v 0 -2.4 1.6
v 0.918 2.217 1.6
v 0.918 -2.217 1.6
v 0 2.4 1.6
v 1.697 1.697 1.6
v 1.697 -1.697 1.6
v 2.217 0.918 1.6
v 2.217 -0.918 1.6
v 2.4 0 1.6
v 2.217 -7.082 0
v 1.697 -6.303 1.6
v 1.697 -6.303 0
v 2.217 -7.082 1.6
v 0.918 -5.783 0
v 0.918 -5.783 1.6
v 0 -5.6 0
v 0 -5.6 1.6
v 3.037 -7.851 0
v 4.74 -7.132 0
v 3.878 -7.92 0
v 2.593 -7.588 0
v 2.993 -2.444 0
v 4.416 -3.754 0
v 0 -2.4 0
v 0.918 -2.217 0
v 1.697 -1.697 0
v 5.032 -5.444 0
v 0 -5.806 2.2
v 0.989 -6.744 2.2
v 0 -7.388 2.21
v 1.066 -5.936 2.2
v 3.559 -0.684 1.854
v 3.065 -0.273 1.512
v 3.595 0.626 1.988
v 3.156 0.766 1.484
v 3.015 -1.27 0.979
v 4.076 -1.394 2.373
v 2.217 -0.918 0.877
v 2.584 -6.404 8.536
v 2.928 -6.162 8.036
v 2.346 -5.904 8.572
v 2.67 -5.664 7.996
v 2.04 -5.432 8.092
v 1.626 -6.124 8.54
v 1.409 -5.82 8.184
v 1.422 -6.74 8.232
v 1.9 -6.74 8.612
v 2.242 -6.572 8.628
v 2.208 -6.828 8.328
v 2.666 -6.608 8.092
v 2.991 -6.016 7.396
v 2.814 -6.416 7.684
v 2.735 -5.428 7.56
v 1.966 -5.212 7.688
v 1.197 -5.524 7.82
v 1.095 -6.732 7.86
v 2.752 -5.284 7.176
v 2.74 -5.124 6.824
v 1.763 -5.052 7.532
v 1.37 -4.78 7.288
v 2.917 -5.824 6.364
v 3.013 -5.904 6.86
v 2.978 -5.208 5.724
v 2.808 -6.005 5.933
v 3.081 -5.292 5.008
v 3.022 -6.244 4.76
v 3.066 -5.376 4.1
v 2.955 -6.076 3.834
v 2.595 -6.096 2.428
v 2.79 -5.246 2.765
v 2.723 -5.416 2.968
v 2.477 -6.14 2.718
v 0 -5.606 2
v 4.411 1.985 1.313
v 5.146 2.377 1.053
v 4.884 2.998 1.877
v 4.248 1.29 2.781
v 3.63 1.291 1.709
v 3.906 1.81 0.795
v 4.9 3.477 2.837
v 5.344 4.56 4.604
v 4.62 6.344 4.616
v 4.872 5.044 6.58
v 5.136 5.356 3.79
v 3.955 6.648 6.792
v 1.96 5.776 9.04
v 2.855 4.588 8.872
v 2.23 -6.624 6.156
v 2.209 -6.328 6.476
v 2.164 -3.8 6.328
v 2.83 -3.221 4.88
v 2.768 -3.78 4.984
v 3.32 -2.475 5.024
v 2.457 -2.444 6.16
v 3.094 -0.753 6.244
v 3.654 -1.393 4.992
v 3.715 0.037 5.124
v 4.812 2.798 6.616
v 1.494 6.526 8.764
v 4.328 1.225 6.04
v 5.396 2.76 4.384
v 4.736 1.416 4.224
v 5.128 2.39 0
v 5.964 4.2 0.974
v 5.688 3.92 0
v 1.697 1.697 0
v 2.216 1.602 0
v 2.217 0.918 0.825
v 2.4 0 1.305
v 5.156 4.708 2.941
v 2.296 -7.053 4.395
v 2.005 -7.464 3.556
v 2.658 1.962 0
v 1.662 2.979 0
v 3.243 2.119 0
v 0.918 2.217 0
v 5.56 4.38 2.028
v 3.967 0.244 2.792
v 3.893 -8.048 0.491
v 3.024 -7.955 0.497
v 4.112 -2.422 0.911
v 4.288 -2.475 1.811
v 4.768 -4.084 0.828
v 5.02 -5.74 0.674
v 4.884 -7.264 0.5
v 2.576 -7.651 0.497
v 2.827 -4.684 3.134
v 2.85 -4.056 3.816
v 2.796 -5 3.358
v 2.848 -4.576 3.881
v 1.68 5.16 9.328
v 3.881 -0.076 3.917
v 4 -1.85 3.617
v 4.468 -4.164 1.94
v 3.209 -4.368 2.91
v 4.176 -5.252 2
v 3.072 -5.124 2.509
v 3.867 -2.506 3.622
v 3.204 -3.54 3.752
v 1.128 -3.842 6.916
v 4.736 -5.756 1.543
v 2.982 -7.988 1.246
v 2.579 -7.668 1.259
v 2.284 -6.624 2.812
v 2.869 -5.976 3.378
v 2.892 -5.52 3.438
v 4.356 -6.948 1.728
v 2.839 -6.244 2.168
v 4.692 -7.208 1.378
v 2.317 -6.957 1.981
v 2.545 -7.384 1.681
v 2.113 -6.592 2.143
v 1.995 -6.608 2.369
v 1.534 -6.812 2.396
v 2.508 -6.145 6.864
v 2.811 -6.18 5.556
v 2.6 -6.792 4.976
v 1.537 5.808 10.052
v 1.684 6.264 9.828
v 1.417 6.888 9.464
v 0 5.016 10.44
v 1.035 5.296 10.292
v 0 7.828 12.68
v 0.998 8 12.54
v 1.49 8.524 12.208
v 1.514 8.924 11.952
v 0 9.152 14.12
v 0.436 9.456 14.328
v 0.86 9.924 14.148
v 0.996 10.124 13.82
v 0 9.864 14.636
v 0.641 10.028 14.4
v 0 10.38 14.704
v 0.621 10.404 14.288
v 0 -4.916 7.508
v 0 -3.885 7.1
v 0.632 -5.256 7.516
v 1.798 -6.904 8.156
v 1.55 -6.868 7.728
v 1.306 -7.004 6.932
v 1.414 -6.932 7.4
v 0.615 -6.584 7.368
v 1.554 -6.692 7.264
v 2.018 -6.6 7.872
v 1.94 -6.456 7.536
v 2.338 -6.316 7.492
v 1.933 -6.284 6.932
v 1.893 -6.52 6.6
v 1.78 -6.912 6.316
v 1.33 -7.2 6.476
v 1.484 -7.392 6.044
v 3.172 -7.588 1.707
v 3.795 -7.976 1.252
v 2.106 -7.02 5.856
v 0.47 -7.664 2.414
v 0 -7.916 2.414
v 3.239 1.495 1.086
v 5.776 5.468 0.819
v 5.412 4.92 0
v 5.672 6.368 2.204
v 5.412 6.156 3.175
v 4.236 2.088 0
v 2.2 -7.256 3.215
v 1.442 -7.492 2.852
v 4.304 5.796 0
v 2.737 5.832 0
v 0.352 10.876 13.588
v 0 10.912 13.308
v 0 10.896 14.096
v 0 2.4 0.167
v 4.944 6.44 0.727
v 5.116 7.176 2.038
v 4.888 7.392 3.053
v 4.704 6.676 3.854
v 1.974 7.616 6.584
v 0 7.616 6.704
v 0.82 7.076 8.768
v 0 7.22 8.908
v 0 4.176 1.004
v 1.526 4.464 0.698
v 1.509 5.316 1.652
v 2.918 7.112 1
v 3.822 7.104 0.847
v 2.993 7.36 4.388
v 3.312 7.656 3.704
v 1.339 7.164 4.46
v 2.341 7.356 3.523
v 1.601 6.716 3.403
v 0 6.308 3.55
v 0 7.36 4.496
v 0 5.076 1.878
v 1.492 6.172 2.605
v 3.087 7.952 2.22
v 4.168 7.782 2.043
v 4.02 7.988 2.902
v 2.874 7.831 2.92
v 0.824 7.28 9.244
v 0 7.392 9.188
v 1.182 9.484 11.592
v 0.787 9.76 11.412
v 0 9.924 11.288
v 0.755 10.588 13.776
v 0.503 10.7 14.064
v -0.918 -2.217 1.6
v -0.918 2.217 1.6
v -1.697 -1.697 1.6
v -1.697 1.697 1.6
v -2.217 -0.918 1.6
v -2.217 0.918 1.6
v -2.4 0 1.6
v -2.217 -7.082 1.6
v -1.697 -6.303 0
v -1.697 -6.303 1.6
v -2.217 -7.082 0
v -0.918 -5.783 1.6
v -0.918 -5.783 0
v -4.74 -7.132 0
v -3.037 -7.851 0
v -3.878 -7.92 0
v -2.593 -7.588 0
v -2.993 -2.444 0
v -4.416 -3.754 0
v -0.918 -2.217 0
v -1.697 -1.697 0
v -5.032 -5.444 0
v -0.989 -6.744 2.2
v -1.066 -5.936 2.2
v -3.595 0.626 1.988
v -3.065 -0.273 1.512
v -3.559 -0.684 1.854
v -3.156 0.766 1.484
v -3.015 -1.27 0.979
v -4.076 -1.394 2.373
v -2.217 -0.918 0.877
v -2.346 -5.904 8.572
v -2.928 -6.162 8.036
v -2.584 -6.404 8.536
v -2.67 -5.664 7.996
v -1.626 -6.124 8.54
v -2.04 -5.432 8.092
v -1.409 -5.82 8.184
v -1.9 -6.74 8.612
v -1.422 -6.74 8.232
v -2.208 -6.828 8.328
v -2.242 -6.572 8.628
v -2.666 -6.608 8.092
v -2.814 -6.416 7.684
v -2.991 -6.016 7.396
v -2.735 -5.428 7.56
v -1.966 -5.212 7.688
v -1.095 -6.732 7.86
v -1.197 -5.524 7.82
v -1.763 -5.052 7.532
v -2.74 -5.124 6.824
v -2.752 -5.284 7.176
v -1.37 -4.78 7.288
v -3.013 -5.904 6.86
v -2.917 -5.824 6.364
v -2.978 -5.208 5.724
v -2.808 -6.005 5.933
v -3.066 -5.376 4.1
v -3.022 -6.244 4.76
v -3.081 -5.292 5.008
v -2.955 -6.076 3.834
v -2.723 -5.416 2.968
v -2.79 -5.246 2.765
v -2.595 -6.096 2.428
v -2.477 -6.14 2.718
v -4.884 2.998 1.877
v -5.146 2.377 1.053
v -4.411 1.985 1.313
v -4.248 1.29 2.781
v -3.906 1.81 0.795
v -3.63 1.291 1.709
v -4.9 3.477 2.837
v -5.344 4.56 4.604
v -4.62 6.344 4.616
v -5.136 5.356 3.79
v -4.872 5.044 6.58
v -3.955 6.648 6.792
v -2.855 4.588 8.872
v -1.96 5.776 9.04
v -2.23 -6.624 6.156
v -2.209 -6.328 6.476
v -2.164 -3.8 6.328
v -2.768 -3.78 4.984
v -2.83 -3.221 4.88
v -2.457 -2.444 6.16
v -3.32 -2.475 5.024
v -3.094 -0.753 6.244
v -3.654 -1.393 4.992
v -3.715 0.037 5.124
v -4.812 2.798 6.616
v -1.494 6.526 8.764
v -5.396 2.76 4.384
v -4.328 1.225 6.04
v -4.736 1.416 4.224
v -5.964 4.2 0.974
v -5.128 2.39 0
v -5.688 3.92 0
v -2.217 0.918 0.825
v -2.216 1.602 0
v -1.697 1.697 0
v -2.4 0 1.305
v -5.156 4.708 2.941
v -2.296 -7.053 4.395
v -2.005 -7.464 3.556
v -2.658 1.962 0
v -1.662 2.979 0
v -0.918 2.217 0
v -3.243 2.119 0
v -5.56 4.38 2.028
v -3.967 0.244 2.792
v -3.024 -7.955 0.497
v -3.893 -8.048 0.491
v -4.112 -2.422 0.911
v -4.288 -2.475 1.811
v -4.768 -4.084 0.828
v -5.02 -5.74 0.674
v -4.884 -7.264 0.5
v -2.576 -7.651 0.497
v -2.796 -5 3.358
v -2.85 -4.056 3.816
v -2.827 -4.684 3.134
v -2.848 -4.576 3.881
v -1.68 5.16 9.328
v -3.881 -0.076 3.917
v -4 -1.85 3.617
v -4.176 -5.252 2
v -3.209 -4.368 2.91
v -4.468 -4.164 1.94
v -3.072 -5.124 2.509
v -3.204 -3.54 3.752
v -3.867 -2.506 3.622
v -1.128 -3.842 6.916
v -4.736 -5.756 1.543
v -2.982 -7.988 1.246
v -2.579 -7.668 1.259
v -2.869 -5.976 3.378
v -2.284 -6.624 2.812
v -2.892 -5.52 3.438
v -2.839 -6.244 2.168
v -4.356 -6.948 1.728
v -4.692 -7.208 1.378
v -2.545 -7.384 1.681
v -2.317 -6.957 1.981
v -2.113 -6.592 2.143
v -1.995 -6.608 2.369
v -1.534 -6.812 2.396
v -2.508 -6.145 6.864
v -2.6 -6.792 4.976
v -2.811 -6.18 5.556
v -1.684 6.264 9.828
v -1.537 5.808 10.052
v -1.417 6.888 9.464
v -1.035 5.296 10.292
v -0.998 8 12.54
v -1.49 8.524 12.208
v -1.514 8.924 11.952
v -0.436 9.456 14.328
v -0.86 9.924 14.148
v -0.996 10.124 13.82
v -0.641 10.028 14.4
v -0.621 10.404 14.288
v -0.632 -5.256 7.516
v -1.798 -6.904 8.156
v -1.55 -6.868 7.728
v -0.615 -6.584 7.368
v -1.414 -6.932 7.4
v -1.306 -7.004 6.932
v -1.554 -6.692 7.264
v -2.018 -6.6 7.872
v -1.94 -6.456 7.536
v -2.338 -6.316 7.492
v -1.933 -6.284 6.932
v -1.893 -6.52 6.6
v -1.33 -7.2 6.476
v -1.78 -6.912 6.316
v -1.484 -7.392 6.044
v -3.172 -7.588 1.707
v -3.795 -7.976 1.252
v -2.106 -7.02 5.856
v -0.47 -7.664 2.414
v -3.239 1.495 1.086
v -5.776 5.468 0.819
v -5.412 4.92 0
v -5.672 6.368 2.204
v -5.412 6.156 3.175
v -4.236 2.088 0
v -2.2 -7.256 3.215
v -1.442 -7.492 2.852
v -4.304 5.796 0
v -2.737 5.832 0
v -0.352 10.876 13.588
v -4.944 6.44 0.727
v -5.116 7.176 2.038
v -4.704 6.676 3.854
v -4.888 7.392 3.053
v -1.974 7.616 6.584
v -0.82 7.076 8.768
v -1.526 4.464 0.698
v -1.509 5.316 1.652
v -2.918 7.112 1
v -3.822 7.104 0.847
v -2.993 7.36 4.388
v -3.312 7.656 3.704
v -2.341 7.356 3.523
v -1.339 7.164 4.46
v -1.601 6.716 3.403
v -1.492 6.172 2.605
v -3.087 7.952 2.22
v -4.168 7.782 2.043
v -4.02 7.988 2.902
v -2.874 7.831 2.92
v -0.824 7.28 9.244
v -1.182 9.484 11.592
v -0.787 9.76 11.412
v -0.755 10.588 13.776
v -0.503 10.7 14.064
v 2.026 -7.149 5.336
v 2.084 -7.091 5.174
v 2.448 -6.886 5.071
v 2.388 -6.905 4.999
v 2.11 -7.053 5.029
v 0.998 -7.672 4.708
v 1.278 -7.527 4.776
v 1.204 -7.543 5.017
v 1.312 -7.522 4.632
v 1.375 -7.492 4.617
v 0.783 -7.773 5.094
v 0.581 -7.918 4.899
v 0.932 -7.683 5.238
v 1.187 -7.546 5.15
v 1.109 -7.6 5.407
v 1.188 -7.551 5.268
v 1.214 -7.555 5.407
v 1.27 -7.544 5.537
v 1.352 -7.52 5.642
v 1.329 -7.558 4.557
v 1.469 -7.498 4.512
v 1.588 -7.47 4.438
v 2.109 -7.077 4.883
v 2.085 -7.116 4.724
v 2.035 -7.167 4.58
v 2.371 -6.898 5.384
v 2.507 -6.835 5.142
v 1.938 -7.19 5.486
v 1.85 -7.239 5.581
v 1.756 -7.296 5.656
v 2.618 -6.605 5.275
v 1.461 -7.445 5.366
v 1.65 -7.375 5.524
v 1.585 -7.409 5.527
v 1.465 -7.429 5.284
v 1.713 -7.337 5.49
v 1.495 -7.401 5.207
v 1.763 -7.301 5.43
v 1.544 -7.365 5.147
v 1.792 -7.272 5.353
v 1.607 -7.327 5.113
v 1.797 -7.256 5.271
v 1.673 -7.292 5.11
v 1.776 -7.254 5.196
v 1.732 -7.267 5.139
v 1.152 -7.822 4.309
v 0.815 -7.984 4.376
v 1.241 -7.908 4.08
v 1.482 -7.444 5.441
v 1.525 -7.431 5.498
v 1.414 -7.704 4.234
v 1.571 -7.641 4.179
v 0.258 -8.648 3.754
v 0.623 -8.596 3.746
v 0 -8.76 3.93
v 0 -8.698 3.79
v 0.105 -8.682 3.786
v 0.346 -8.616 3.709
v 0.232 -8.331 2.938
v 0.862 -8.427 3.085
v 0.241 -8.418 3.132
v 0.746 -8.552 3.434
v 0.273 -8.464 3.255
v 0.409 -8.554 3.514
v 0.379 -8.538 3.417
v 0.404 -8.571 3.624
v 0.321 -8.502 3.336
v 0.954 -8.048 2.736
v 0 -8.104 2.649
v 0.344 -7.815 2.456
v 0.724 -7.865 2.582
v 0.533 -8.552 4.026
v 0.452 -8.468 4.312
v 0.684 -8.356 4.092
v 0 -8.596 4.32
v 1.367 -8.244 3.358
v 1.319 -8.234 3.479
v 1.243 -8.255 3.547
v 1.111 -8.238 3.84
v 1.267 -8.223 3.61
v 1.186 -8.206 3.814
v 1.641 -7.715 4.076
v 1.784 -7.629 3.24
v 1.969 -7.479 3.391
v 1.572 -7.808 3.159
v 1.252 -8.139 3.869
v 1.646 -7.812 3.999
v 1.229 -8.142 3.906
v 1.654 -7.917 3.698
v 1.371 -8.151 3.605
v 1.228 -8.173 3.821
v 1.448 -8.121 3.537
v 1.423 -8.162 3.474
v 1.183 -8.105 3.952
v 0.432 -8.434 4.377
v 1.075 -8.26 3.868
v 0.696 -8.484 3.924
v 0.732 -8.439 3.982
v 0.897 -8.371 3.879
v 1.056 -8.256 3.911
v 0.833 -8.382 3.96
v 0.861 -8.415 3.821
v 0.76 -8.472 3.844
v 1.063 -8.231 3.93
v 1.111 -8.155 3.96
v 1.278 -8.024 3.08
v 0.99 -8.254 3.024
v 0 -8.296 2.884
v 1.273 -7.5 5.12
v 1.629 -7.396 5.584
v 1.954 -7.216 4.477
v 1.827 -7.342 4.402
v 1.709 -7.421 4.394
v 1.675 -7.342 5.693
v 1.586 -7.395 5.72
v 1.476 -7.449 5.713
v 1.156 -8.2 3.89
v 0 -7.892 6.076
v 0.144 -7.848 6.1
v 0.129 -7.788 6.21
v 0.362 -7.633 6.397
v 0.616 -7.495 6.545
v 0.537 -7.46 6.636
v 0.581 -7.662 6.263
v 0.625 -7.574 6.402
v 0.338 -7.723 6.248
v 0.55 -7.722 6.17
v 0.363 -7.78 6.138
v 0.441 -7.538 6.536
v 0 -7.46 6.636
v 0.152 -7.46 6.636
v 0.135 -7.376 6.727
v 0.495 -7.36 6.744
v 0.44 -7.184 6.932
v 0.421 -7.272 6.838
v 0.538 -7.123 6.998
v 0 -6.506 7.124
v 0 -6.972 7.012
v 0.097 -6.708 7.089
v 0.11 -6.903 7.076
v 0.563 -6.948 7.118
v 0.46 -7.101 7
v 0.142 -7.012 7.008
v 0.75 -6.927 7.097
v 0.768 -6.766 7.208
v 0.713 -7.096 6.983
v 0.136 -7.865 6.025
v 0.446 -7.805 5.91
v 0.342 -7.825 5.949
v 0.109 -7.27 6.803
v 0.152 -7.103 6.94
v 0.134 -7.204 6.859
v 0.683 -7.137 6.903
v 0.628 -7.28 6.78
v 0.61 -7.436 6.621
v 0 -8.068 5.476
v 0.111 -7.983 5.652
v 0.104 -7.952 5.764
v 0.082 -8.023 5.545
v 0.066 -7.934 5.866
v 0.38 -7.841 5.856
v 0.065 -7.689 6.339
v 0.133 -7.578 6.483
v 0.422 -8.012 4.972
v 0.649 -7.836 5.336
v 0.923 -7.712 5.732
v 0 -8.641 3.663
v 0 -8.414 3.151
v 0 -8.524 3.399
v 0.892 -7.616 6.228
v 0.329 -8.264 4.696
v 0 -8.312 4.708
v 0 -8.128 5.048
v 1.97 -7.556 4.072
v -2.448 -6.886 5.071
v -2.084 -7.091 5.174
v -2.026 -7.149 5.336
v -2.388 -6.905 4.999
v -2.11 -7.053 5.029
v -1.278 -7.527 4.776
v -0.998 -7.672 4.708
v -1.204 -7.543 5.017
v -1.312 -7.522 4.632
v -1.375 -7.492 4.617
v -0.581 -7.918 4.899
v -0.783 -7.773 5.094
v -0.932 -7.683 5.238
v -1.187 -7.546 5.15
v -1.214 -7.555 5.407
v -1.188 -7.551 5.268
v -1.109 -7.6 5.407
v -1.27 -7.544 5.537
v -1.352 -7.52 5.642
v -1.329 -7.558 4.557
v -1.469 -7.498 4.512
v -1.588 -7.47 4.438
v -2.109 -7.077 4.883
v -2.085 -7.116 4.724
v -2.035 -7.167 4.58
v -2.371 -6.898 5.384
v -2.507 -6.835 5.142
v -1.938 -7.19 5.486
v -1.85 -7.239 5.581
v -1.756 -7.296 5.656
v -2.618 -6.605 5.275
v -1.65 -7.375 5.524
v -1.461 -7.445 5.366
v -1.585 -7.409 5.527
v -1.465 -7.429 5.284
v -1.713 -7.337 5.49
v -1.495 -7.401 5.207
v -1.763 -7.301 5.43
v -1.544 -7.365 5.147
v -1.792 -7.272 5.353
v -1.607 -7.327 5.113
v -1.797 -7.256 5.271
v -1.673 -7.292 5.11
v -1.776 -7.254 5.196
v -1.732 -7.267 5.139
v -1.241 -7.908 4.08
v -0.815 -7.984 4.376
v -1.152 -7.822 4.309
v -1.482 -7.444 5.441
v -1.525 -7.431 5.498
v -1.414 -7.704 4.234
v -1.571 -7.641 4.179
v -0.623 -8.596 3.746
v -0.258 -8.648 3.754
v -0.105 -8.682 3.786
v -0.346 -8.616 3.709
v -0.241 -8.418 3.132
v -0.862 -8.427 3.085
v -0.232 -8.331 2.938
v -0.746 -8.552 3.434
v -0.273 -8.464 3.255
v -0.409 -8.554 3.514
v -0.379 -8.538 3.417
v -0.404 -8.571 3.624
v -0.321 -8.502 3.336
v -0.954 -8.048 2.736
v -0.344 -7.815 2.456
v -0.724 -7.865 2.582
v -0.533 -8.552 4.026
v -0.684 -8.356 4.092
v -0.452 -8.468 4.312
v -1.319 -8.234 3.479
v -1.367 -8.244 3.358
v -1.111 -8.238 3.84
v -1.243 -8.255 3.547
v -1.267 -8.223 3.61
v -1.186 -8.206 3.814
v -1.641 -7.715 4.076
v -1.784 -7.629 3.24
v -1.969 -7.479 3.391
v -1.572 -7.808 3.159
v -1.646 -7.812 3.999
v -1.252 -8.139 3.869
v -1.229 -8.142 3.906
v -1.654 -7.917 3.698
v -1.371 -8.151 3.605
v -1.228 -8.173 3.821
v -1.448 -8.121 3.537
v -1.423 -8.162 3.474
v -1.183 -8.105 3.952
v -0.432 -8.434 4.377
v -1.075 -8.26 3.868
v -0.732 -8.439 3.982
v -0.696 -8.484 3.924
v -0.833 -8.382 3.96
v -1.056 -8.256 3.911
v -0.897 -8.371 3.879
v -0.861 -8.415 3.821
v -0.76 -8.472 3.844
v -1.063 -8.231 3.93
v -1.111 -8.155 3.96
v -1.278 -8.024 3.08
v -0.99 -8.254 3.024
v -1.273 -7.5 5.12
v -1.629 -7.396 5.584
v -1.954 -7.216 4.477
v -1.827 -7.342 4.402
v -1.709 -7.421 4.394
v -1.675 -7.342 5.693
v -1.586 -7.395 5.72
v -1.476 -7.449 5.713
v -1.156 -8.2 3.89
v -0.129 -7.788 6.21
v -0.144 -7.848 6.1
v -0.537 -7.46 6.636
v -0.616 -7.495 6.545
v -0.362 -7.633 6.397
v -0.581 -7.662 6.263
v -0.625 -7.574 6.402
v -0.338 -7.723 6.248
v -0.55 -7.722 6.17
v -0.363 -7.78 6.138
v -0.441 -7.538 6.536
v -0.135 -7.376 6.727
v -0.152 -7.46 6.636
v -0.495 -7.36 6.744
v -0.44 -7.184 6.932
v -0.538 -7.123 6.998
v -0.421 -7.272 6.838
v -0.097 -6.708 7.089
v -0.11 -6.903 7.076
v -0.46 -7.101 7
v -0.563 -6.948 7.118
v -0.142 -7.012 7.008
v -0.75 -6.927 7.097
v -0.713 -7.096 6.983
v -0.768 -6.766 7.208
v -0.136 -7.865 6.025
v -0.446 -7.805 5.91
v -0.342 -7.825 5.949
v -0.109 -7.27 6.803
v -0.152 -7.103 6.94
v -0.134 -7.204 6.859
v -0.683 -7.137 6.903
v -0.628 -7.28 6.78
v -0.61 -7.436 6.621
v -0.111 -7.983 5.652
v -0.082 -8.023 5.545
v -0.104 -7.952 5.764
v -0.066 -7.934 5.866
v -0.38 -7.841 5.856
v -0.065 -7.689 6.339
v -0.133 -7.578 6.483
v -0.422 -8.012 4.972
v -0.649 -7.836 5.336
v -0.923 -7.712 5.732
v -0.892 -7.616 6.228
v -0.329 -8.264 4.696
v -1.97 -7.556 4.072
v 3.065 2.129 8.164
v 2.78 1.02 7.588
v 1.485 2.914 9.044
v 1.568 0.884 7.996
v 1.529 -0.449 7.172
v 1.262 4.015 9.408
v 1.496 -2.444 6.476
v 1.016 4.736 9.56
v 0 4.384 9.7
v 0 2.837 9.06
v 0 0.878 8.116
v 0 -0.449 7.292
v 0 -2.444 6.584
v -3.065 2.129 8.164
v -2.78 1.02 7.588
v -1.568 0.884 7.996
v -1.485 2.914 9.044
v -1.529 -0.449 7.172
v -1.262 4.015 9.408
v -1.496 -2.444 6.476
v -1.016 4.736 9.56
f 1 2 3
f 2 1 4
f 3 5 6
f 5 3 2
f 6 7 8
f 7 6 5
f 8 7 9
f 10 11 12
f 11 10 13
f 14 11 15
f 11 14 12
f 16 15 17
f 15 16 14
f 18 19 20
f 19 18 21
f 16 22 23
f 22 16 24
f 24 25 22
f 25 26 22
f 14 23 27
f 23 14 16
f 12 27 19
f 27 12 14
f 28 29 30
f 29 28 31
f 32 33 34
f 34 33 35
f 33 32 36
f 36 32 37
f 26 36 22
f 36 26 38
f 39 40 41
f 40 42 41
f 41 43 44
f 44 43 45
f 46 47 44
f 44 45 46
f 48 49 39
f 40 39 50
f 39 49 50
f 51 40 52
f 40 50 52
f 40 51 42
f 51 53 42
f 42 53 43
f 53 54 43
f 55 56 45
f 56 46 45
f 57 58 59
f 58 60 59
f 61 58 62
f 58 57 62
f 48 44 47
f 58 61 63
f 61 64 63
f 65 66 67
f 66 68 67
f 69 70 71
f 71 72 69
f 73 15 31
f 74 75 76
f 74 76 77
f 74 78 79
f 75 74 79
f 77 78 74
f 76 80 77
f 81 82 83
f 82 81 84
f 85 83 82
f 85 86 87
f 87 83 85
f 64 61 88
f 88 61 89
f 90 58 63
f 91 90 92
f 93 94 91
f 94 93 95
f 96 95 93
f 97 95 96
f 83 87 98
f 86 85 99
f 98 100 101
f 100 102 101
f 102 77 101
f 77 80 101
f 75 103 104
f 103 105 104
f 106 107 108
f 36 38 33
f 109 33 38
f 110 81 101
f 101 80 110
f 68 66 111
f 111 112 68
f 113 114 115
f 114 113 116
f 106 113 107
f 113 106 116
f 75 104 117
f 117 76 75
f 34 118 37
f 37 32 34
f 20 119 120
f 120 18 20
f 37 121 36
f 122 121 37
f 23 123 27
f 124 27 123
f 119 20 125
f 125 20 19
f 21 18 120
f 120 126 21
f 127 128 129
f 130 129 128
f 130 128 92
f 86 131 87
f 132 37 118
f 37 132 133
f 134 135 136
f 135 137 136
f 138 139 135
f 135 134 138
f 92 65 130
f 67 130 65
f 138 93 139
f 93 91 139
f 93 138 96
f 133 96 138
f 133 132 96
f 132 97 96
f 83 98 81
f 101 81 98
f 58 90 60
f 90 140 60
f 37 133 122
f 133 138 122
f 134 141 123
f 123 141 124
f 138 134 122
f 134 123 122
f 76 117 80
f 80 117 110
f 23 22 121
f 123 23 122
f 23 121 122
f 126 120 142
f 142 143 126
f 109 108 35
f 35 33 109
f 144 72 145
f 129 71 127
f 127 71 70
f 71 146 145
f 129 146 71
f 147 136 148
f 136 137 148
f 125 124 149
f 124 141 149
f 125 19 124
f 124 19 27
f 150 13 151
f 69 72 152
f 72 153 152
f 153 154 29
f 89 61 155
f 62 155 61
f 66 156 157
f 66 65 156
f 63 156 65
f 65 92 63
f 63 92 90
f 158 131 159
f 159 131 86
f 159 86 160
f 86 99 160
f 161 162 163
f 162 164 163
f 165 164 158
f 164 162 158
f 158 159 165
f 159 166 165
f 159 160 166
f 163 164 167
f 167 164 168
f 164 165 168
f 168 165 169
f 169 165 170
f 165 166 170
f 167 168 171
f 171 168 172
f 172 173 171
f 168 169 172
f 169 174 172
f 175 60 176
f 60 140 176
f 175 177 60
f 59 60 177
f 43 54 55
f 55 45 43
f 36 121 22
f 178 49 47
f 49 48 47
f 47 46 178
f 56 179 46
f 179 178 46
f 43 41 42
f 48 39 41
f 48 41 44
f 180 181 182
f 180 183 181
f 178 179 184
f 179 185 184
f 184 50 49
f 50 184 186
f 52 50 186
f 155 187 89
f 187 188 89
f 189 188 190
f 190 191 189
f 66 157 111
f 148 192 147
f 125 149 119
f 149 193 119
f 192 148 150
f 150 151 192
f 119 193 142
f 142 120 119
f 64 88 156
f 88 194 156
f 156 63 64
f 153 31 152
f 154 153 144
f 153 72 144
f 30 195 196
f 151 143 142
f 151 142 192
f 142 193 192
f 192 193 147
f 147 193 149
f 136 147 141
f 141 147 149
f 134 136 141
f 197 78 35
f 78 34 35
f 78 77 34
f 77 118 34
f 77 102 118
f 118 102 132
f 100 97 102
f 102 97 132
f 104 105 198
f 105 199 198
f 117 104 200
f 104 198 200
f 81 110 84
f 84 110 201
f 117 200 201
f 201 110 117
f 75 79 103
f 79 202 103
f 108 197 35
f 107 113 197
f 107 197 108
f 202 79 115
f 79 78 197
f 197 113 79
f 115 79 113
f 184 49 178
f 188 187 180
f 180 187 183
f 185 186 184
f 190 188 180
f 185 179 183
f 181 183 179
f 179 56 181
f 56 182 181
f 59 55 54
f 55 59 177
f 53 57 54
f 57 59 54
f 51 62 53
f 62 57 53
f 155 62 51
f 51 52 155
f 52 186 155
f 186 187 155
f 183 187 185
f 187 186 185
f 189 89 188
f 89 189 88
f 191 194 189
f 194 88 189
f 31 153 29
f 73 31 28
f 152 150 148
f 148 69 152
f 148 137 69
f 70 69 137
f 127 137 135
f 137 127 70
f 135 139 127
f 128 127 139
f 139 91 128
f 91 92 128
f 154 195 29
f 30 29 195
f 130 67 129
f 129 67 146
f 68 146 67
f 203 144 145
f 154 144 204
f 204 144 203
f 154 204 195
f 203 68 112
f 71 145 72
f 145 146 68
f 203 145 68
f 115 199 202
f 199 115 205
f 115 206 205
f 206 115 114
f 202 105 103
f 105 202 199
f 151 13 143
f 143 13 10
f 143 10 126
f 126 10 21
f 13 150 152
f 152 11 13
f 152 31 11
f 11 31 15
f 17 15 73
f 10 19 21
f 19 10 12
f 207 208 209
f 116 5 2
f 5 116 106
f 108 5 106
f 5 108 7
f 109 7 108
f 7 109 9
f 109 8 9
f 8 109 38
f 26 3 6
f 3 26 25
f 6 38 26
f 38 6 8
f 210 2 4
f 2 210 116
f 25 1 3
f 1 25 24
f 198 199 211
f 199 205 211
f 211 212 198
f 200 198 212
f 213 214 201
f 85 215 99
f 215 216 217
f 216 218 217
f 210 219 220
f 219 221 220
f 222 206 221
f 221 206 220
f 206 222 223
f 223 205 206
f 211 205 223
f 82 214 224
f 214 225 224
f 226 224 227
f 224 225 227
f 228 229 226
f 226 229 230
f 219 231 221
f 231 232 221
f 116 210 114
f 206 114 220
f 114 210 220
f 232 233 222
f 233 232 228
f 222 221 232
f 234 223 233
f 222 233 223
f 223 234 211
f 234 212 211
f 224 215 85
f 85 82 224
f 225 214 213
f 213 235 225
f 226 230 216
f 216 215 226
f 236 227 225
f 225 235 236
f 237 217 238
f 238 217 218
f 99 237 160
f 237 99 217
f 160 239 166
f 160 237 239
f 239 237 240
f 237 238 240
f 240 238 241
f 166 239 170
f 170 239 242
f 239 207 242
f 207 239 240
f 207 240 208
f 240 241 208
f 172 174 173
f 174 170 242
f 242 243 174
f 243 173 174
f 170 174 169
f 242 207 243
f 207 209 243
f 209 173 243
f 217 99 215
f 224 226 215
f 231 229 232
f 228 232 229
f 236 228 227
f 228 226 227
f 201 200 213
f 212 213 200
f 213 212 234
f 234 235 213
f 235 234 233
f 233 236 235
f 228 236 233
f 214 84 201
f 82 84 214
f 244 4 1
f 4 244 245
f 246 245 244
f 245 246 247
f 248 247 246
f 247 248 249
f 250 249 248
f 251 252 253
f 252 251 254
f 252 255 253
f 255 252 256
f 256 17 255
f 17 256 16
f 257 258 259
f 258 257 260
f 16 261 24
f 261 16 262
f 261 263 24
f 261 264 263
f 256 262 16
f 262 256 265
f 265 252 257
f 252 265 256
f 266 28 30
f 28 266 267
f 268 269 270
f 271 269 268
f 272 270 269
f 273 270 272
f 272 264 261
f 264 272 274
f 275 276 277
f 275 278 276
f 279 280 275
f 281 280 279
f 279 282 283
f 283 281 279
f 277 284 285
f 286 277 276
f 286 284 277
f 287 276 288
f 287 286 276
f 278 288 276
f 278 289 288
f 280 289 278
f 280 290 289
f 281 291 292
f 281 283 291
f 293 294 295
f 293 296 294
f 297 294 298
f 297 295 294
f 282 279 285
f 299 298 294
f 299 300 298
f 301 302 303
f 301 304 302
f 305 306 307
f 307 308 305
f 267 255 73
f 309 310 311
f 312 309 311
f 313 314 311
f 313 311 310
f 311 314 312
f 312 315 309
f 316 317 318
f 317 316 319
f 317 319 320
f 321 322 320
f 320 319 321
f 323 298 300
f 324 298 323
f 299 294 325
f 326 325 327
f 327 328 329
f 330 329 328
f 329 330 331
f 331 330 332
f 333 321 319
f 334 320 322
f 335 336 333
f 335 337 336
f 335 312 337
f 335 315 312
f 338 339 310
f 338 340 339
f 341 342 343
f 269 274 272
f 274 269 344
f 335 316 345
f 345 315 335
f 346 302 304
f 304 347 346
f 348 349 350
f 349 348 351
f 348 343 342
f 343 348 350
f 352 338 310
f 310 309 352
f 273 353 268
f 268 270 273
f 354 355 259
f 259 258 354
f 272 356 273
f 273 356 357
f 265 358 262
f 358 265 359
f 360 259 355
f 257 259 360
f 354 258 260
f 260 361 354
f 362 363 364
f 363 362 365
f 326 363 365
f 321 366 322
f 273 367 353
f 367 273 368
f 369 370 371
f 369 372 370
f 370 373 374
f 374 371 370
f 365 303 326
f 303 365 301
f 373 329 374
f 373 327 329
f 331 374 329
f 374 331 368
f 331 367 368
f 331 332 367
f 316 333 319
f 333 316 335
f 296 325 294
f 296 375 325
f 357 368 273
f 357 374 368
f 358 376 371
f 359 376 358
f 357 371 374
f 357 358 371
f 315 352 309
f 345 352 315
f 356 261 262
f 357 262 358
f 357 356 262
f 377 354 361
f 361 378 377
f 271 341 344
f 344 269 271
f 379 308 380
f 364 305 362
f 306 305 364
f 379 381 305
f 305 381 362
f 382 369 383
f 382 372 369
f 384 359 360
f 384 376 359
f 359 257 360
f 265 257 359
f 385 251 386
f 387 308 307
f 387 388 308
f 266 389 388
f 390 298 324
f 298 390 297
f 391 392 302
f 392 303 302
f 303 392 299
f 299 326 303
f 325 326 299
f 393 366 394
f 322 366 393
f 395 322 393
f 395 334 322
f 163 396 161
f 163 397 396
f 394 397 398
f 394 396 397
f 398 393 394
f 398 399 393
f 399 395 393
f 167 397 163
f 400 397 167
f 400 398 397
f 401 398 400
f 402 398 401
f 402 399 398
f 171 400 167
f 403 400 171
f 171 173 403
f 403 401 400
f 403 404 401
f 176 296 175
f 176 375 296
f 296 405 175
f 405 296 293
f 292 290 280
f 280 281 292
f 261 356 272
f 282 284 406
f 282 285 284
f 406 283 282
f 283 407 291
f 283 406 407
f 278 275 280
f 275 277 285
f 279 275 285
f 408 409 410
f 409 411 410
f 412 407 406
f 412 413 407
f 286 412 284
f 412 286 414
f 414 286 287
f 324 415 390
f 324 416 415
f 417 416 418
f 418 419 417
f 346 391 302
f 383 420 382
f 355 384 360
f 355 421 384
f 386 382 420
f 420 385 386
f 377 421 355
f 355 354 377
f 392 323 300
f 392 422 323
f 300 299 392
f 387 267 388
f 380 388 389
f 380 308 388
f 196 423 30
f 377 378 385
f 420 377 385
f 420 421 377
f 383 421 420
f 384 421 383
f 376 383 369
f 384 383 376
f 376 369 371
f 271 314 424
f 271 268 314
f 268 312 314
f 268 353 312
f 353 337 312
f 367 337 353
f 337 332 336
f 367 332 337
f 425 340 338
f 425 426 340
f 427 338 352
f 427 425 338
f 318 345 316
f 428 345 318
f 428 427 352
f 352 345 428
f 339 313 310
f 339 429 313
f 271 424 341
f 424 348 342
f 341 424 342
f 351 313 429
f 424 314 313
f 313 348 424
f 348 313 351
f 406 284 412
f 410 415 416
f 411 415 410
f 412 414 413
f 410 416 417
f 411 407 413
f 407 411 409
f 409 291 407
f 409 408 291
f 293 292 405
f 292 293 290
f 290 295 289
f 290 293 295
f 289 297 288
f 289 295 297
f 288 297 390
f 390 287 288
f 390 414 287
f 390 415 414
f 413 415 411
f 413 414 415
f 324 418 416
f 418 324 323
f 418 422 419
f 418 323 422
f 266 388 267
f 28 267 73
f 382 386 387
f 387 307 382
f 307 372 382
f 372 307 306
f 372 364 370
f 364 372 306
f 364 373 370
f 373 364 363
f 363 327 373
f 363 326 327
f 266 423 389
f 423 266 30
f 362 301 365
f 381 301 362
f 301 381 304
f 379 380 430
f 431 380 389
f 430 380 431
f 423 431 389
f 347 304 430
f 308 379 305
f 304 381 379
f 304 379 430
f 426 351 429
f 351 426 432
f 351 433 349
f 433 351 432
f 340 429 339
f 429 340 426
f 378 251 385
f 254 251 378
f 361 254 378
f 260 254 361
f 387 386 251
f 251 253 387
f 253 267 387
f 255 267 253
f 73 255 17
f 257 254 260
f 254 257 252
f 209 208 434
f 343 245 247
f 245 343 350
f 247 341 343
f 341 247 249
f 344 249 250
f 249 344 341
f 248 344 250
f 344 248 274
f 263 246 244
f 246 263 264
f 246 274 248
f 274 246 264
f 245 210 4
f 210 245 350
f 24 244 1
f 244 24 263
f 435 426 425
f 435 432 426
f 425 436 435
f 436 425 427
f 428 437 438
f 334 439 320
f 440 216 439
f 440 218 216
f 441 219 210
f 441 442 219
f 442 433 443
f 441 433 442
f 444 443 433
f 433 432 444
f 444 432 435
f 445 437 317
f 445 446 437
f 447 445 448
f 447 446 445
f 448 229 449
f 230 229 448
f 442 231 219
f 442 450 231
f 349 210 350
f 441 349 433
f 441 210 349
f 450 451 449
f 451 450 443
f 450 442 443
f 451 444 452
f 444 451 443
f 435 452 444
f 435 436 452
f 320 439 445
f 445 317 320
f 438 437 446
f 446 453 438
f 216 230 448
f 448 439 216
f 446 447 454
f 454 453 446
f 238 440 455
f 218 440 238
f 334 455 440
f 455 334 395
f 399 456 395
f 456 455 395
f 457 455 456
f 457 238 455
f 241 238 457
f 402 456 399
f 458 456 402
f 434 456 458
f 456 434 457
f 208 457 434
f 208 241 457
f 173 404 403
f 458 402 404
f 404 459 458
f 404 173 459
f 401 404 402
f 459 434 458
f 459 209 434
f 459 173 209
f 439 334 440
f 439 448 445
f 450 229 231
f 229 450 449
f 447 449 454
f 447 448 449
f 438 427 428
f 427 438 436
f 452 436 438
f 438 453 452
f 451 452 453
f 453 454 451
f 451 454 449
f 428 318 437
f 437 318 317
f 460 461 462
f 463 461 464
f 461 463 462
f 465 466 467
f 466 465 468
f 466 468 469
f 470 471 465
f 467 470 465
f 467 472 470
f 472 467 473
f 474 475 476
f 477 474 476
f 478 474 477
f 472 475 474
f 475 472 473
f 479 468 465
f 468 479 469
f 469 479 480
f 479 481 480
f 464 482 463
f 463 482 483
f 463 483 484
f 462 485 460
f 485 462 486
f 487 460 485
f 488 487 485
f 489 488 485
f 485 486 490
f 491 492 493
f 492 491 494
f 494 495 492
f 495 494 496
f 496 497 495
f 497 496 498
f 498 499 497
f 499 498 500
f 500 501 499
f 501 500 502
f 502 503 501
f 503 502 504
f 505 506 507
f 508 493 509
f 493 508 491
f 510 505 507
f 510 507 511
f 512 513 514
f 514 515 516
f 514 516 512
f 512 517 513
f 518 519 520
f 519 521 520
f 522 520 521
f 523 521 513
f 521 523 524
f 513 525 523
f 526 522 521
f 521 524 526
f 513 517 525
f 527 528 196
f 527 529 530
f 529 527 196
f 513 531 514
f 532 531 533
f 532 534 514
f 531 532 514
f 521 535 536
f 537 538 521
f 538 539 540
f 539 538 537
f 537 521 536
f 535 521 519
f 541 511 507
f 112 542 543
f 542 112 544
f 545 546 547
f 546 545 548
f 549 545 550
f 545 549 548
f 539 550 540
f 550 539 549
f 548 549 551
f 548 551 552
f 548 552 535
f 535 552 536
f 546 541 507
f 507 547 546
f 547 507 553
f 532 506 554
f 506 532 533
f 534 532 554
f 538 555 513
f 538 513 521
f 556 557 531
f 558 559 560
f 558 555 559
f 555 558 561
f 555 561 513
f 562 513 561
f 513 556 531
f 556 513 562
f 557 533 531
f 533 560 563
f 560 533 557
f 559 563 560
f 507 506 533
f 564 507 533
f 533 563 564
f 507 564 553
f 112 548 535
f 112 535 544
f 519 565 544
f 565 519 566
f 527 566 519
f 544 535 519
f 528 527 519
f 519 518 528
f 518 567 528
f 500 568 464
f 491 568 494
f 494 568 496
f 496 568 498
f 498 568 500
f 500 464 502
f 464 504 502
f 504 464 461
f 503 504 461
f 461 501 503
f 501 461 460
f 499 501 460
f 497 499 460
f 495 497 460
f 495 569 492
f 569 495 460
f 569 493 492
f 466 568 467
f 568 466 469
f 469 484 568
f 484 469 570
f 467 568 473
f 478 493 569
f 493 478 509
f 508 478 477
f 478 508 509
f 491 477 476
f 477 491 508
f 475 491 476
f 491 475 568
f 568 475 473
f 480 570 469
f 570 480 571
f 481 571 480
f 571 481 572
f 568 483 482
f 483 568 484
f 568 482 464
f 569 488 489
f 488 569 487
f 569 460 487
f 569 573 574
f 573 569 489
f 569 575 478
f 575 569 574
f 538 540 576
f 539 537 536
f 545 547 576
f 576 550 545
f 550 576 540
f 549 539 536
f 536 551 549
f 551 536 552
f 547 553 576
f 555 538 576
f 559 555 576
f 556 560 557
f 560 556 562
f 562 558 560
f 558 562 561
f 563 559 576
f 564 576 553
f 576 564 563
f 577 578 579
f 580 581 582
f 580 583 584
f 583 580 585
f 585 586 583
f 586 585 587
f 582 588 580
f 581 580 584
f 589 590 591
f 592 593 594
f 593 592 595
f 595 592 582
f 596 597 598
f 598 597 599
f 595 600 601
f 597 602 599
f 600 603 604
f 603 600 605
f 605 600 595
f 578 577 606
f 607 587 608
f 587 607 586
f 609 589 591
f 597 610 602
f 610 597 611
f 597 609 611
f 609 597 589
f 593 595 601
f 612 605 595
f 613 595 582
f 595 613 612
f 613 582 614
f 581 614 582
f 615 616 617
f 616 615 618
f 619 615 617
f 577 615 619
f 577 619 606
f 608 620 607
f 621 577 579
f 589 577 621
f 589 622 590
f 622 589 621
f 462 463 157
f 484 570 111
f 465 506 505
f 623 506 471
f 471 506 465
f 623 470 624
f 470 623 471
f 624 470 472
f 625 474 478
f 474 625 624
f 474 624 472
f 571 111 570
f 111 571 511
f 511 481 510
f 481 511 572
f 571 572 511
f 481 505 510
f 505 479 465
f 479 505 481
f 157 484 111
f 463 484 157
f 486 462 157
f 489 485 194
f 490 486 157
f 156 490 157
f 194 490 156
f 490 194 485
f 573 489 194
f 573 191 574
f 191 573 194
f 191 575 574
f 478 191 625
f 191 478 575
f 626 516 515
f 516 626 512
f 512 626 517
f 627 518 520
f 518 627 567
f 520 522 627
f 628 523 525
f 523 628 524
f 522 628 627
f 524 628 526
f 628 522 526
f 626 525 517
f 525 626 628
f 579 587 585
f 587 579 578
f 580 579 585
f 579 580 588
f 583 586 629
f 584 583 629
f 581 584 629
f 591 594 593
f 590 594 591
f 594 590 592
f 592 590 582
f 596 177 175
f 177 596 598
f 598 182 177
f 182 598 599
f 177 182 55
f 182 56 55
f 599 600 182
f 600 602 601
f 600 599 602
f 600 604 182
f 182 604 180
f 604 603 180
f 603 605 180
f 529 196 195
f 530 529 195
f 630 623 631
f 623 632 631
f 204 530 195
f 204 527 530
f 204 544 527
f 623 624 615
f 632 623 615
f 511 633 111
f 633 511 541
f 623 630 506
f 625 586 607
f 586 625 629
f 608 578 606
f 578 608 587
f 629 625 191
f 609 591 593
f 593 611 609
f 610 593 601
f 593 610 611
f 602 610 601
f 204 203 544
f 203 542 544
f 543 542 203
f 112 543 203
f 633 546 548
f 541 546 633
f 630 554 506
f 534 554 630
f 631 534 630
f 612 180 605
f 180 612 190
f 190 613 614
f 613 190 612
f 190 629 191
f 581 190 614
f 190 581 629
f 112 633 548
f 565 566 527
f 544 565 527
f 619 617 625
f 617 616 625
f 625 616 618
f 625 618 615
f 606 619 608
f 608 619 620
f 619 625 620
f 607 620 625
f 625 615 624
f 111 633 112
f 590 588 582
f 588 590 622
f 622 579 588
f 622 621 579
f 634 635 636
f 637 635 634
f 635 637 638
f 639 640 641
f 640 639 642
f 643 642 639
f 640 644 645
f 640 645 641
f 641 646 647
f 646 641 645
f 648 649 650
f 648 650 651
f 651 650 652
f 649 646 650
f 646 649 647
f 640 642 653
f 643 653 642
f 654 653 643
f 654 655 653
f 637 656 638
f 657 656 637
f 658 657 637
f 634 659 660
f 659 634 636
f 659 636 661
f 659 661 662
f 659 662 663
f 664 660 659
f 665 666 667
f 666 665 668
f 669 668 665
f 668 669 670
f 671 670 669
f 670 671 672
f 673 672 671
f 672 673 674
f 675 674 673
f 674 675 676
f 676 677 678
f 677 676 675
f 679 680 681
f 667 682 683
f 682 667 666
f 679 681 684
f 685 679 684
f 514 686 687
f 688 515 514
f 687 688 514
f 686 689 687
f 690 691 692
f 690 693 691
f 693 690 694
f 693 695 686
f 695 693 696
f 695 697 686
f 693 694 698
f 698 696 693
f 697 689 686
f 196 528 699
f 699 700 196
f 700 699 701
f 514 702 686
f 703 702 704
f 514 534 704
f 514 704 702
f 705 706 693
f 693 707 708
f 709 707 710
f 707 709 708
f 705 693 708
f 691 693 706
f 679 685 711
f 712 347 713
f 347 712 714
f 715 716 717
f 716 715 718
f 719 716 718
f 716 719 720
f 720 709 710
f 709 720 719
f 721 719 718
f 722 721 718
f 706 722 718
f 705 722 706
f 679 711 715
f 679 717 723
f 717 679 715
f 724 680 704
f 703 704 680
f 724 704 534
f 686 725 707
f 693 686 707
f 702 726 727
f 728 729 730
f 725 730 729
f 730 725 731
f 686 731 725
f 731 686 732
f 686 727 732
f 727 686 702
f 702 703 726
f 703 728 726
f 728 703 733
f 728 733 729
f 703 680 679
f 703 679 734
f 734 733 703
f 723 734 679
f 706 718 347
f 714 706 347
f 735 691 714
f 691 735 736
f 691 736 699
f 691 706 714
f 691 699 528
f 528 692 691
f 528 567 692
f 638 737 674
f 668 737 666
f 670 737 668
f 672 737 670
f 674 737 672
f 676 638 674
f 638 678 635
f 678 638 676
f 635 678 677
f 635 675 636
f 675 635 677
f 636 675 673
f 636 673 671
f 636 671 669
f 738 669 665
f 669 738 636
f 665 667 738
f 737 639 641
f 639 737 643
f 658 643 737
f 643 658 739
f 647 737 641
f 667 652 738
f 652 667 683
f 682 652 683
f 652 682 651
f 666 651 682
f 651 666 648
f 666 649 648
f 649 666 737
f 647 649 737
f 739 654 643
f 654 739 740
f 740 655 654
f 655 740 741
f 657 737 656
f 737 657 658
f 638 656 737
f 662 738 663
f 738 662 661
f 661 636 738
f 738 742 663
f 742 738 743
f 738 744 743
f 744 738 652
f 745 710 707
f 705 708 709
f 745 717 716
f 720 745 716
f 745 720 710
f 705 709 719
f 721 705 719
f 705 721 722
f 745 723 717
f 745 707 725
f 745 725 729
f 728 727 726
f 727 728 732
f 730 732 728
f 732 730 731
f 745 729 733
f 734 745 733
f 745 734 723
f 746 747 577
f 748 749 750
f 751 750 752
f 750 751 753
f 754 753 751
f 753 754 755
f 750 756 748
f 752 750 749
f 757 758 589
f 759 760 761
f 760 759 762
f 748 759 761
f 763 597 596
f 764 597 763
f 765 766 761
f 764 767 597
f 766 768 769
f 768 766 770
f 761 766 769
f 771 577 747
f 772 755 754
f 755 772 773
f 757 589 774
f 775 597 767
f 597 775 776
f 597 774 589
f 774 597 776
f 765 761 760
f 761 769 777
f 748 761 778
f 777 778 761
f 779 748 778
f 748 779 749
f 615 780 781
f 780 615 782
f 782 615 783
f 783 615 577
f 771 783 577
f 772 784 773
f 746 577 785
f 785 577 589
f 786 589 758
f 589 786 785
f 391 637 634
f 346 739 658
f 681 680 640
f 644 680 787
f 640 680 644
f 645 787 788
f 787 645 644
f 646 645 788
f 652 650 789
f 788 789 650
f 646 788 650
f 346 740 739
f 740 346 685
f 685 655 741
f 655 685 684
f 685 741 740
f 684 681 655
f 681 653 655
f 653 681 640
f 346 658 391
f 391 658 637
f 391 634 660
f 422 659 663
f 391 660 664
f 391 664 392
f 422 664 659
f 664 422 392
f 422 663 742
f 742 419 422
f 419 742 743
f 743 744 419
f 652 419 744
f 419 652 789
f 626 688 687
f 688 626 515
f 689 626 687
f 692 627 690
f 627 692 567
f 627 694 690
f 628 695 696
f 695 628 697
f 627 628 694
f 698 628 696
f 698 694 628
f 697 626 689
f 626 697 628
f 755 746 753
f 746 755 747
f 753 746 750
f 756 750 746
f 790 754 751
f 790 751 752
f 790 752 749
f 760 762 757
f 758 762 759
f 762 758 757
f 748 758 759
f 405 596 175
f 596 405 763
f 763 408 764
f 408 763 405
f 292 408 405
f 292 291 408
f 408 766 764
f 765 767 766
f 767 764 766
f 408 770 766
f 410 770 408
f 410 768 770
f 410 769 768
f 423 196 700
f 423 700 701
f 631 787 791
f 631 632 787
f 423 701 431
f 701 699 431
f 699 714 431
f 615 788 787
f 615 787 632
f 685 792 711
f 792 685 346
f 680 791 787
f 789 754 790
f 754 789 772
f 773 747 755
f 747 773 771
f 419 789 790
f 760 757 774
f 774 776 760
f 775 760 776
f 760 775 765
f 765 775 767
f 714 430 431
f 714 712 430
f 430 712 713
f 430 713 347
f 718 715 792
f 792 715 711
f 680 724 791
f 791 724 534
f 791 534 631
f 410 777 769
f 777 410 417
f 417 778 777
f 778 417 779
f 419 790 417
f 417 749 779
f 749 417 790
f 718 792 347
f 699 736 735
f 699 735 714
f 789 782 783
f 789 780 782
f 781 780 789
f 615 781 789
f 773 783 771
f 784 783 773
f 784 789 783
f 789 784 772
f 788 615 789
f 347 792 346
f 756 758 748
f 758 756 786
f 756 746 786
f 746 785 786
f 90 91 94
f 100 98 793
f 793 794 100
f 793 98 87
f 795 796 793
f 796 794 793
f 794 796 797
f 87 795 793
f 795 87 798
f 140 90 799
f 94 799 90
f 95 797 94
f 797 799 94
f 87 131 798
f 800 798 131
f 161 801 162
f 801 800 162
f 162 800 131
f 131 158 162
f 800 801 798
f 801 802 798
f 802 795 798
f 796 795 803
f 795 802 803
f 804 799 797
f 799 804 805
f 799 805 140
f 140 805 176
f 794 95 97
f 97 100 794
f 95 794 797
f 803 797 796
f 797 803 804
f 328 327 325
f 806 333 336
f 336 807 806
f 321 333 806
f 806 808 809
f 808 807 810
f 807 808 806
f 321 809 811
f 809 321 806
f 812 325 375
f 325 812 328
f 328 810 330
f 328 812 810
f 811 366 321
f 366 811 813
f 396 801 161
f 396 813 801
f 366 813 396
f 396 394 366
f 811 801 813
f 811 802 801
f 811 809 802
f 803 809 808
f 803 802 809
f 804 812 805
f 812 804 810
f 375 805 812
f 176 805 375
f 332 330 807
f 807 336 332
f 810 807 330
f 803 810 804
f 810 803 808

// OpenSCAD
use <../lib.scad>
use <s/6251p06s01.scad>
use <s/6251s01.scad>
use <s/6251s03.scad>
$fa=1; $fs=0.2;
function ldraw_lib__6251p06(realsolid=false) = [
// 0 Animal Cat Crouching with Black Eyes, Yellow Sclera, Dark Brown Stripes on Head and White Muzzle Pattern
// 0 Name: 6251p06.dat
// 0 Author: Willy Tschager [Holly-Wood]
// 0 !LDRAW_ORG Part UPDATE 2022-06
// 0 !LICENSE Licensed under CC BY 2.0 and CC BY 4.0 : see CAreadme.txt
// 
// 0 BFC CERTIFY CCW
  [0,"BFC","CERTIFY"],
  [0,"BFC","CCW"],
// 
// 0 !KEYWORDS creature, mousetrap, pet, set 10218
// 
// 0 !HISTORY 2022-12-20 [PTadmin] Official Update 2022-06
// 
// 
// 0 // Half without Patternable Area
// 
// 1 16 0 0 0 1 0 0 0 1 0 0 0 1 s\6251s01.dat
  [1,16,0,0,0,1,0,0,0,1,0,0,0,1, ldraw_lib__s__6251s01(realsolid)],
// 1 16 0 0 0 -1 0 0 0 1 0 0 0 1 s\6251s01.dat
  [1,16,0,0,0,-1,0,0,0,1,0,0,0,1, ldraw_lib__s__6251s01(realsolid)],
// 
// 0 // Patternable Area
// 1 16 0 0 0 1 0 0 0 1 0 0 0 1 s\6251p06s01.dat
  [1,16,0,0,0,1,0,0,0,1,0,0,0,1, ldraw_lib__s__6251p06s01(realsolid)],
// 1 16 0 0 0 -1 0 0 0 1 0 0 0 1 s\6251p06s01.dat
  [1,16,0,0,0,-1,0,0,0,1,0,0,0,1, ldraw_lib__s__6251p06s01(realsolid)],
// 
// 0 // Patternable Area Back
// 1 16 0 0 0 1 0 0 0 1 0 0 0 1 s\6251s03.dat
  [1,16,0,0,0,1,0,0,0,1,0,0,0,1, ldraw_lib__s__6251s03(realsolid)],
// 1 16 0 0 0 -1 0 0 0 1 0 0 0 1 s\6251s03.dat
  [1,16,0,0,0,-1,0,0,0,1,0,0,0,1, ldraw_lib__s__6251s03(realsolid)],
];
module ldraw_lib__6251p06(step=0, col=false, unit=2/5, alt=false, line=0.2, solid=!$preview)
    makepoly(ldraw_lib__6251p06(solid), step=step, col=col, unit=unit, alt=alt, line=line, solid=solid);
ldraw_lib__6251p06(line=0.2);
